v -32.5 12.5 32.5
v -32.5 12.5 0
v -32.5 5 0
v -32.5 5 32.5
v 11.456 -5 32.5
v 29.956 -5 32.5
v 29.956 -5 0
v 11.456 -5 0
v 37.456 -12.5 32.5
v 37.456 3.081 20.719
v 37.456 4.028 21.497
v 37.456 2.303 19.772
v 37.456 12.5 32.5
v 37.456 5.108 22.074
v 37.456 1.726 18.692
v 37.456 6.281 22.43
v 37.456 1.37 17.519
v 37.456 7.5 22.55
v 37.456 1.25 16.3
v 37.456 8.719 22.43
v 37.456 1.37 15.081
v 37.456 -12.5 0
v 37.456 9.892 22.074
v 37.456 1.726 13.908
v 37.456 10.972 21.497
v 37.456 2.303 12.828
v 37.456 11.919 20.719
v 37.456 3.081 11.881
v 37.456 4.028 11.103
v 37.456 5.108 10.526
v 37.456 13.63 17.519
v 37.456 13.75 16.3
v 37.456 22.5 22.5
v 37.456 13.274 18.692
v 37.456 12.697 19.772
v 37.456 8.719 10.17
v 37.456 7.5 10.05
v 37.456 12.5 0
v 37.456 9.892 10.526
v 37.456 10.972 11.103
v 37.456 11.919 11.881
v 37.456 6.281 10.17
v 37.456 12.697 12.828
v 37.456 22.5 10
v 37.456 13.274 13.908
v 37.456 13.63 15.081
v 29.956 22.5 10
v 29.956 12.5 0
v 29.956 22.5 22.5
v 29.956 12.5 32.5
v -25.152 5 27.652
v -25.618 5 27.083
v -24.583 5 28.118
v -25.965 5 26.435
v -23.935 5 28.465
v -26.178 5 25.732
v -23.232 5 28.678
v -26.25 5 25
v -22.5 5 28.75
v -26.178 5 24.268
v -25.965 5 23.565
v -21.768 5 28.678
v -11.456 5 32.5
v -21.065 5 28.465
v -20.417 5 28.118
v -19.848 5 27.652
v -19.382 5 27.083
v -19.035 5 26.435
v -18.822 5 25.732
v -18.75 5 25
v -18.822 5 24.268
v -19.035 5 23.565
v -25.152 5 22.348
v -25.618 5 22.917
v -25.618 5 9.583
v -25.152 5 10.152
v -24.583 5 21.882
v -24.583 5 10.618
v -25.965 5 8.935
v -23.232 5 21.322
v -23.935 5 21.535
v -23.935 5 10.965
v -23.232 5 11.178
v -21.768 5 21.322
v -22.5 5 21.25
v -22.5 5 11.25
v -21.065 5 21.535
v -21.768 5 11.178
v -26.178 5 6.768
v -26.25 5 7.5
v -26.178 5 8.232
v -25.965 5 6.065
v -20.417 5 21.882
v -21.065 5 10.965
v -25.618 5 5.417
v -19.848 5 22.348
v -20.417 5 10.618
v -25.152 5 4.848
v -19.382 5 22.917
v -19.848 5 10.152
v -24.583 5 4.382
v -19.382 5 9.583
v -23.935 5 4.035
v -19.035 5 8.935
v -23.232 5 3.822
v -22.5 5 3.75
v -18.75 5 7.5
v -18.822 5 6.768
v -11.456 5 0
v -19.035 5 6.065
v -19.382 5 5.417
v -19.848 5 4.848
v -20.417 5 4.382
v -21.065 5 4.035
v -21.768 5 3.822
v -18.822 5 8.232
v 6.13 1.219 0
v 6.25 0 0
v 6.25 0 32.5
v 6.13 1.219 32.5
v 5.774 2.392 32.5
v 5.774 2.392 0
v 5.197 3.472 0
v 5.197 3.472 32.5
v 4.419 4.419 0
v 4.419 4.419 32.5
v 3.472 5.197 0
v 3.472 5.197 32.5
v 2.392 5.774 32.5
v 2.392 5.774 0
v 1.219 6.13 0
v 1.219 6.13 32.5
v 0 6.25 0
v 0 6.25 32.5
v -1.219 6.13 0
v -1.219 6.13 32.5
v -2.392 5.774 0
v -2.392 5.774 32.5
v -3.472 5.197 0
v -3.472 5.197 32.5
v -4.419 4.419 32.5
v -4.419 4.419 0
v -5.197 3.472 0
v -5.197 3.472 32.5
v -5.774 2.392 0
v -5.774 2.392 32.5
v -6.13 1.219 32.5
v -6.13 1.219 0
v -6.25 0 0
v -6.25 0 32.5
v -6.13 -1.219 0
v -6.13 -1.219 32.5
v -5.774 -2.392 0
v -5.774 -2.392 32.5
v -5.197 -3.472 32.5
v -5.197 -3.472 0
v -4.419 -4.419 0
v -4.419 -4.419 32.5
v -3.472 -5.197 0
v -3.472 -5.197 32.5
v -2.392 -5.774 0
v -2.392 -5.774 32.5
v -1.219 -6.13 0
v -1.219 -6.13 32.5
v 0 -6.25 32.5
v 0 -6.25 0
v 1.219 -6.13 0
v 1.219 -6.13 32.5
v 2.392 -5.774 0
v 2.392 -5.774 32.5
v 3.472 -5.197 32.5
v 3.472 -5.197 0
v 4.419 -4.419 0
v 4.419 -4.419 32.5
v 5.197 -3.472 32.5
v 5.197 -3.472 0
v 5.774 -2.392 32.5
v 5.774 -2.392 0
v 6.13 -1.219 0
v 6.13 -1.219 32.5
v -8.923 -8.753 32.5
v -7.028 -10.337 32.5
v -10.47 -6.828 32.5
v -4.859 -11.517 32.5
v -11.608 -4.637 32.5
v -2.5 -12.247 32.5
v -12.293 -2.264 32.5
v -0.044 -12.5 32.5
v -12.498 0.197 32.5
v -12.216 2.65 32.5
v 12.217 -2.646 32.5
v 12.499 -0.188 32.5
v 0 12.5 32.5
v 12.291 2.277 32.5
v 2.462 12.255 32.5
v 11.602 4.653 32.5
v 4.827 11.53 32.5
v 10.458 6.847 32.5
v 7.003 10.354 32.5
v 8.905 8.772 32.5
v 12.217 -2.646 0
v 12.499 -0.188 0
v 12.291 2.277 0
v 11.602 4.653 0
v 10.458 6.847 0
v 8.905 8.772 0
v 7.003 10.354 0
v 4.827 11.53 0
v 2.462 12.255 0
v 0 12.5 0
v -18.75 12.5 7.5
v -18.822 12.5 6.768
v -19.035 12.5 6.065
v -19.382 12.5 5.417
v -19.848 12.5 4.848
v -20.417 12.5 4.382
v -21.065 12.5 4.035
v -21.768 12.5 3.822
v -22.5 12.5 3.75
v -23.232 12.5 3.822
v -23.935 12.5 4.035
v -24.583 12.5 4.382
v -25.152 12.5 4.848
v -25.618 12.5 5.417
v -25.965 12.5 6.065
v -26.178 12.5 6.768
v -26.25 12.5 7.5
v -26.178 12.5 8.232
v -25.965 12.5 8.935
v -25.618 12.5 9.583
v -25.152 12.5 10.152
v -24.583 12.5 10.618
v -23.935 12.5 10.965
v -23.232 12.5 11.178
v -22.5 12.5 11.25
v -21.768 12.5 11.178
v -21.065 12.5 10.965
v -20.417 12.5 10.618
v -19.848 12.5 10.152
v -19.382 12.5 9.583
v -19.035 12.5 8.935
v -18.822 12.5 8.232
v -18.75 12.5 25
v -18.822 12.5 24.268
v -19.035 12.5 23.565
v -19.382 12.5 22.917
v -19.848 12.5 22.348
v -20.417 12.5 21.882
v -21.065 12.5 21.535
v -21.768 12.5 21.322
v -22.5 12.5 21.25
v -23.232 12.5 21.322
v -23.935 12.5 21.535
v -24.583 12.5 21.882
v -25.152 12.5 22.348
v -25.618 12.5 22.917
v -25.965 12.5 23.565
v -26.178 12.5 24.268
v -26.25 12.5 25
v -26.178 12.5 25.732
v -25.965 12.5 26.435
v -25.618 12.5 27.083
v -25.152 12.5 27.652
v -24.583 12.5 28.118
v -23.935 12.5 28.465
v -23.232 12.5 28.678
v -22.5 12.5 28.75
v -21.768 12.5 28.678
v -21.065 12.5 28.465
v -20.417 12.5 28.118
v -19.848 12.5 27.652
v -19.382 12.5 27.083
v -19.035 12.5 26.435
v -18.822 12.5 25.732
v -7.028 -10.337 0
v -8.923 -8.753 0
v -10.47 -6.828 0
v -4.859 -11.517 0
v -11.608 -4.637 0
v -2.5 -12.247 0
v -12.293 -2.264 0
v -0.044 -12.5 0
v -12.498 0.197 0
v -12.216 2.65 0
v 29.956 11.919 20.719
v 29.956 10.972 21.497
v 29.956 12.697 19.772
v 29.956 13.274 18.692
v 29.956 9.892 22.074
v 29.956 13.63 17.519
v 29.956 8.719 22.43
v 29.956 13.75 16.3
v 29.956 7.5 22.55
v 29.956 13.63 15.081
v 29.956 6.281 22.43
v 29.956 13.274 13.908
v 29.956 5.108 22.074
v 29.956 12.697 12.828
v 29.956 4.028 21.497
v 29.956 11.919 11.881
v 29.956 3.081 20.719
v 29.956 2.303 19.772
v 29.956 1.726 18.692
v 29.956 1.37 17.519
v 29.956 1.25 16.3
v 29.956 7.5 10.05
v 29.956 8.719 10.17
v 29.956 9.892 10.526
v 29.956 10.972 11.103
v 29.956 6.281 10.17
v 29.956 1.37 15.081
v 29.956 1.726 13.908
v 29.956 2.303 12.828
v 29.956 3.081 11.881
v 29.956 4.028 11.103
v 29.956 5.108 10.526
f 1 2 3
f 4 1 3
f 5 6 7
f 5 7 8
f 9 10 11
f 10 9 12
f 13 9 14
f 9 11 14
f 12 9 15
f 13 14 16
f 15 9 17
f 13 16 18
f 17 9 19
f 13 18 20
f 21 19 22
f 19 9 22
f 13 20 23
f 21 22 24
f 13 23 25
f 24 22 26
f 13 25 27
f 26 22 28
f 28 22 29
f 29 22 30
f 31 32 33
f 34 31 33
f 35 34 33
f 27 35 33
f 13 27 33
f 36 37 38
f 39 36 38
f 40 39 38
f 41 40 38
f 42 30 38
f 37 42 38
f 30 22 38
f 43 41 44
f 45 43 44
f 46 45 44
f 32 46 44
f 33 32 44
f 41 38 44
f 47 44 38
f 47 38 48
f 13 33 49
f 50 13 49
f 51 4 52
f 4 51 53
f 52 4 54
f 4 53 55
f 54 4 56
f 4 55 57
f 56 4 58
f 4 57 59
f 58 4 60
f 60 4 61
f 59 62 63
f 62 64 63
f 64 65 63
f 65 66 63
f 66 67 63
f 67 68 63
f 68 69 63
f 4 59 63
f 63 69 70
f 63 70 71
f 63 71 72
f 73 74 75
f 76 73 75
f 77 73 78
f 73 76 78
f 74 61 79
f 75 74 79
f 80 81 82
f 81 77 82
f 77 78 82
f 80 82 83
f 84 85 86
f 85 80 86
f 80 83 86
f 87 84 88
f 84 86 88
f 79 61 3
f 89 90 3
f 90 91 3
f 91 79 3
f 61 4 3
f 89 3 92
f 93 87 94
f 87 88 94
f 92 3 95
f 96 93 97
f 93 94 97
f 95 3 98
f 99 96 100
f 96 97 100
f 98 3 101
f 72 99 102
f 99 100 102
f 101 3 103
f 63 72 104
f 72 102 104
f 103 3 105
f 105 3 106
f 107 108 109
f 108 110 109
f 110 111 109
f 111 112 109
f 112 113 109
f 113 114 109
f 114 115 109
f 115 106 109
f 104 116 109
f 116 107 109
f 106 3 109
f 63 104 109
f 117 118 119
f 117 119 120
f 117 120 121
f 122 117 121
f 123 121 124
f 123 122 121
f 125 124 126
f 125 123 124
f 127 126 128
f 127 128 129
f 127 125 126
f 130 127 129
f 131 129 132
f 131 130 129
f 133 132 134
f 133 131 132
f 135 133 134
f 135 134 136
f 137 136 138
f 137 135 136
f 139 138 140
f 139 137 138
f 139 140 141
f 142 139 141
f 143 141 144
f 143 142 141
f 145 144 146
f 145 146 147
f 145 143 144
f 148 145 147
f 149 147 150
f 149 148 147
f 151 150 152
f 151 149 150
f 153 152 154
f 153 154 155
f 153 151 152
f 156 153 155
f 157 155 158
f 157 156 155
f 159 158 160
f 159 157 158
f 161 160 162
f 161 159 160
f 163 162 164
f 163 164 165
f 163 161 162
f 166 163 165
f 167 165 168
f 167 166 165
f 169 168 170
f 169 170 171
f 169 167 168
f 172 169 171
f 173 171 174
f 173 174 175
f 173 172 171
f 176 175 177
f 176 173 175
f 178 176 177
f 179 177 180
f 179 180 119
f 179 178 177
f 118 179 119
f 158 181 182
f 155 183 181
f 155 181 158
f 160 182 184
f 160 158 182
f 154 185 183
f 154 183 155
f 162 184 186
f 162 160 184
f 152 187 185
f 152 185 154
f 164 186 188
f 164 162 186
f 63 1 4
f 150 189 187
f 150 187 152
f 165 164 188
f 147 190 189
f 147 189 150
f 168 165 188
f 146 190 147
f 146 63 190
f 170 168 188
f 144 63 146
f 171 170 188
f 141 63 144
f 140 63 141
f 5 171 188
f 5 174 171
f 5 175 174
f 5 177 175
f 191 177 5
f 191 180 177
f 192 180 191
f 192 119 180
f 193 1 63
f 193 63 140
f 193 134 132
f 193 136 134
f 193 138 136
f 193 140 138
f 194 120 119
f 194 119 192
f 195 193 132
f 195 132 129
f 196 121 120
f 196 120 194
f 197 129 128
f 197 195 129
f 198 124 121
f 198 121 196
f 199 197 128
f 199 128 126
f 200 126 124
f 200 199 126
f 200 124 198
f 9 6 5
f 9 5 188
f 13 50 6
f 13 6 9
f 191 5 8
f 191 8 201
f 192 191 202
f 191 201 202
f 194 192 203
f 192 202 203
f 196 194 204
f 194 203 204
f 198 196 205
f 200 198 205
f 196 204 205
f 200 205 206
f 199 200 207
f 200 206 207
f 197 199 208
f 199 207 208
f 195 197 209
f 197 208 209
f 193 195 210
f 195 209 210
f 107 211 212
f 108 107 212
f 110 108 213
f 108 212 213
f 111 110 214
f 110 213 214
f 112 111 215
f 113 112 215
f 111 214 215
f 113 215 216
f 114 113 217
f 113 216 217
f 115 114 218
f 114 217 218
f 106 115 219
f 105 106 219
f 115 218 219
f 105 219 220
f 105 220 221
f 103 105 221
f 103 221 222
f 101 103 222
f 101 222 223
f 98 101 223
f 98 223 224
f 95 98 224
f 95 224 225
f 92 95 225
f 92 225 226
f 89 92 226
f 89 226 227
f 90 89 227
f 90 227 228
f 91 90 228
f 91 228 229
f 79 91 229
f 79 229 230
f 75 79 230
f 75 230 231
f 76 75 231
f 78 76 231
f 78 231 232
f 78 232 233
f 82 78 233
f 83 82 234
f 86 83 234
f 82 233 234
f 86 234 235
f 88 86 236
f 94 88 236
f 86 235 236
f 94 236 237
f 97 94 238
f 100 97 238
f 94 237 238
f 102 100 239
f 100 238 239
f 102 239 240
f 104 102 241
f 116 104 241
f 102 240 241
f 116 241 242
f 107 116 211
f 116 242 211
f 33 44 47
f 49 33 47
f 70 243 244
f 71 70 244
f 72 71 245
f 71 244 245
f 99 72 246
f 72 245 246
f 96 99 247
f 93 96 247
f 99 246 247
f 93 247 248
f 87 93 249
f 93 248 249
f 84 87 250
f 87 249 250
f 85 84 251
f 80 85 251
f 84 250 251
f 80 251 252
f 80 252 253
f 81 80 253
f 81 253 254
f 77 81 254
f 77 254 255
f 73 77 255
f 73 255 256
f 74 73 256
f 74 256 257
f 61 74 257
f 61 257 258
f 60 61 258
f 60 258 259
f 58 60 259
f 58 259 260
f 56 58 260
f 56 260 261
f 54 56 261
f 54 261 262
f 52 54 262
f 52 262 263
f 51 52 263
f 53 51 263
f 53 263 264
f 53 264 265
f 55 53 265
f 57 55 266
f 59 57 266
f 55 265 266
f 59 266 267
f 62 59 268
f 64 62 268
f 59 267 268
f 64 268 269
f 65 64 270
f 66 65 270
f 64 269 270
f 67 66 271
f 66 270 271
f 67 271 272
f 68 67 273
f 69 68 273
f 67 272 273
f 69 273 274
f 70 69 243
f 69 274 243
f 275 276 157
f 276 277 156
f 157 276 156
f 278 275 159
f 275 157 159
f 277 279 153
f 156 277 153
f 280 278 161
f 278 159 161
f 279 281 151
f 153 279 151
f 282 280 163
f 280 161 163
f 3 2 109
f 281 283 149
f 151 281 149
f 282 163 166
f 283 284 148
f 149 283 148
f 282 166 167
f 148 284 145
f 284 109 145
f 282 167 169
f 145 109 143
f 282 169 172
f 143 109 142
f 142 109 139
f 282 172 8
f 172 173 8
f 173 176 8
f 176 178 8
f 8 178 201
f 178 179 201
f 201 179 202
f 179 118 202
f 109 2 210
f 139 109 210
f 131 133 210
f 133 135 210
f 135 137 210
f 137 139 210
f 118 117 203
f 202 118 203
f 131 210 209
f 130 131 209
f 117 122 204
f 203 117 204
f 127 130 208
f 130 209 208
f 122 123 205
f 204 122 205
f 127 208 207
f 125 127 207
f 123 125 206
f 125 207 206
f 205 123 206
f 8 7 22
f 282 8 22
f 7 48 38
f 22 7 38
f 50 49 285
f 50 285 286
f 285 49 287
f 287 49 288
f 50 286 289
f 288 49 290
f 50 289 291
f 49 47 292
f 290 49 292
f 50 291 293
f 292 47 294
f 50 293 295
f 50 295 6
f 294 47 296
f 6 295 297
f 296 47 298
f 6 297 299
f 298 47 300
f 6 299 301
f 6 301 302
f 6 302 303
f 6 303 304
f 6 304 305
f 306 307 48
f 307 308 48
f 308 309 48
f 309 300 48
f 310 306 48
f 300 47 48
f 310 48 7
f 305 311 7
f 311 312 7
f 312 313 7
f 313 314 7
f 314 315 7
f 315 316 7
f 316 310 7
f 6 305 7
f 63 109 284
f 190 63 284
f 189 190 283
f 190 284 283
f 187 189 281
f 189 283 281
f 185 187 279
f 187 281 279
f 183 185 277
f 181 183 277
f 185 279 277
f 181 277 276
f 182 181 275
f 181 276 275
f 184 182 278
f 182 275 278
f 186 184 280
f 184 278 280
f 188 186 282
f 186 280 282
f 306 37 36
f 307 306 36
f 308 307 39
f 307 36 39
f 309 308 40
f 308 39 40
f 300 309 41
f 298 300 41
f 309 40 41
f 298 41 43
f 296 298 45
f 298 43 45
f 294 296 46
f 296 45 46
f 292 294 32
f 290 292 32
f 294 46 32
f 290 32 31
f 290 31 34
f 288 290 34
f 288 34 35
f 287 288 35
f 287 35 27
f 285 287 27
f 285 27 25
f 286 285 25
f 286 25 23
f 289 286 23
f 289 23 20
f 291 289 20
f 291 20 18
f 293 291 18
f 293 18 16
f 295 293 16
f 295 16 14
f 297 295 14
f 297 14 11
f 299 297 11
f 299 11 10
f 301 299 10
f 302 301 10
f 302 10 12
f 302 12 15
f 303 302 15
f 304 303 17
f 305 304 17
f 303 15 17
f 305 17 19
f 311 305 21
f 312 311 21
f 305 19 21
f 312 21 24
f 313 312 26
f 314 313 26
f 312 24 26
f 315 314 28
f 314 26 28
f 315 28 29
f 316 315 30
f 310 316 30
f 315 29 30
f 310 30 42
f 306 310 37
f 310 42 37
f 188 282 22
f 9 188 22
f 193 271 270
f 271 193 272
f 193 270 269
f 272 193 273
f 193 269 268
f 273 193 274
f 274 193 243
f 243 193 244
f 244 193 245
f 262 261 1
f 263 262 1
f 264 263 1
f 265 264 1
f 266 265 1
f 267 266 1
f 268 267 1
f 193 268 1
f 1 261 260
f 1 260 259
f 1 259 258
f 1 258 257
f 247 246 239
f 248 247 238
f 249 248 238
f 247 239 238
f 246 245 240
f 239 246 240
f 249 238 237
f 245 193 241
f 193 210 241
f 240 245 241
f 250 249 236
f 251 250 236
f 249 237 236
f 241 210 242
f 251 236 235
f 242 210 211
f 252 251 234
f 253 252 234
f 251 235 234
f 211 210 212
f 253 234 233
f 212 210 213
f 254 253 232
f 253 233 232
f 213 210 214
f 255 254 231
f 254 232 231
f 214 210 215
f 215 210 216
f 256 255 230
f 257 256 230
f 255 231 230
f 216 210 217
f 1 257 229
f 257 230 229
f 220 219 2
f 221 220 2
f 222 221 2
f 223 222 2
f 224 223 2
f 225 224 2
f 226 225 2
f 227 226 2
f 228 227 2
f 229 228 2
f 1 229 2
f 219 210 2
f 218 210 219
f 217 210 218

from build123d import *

# Parameters (mm, degrees)
SKETCH1_R               = 6.25
BOSS_EXTRUDE1_DEPTH     = 32.5
SKETCH2_R               = 3.75
CUT_EXTRUDE1_DEPTH      = 11.000075787
CUT_EXTRUDE1_DEPTH_BACK = 25.999924213
CUT_EXTRUDE2_REACH      = 71.956
SKETCH3_R               = 6.25
CHAMFER1_SIZE           = 10


with BuildPart() as part:
    # Sketch1 → Boss-Extrude1 (new body)
    with BuildSketch(Plane.XY):
        with BuildLine():
            Line((0, 12.5), (-32.5, 12.5))
            Line((-32.5, 12.5), (-32.5, 5))
            Line((-32.5, 5), (-11.456439237, 5))
            ThreePointArc((-11.456439237, 5), (-10.470155046, -6.828312626), (-0.043527687, -12.499924213))
            Line((-0.043527687, -12.499924213), (37.456472313, -12.499924213))
            Line((37.456472313, -12.499924213), (37.456472313, 22.500075787))
            Line((37.456472313, 22.500075787), (29.956472313, 22.500075787))
            Line((29.956472313, 22.500075787), (29.956472313, -4.999924213))
            Line((29.956472313, -4.999924213), (11.456472313, -4.999924213))
            ThreePointArc((11.456472313, -4.999924213), (10.458227686, 6.84656656), (0, 12.5))
        make_face()
        Circle(SKETCH1_R, mode=Mode.SUBTRACT)
    extrude(amount=BOSS_EXTRUDE1_DEPTH)

    # Sketch2 → Cut-Extrude1 (cut, two sides)
    with BuildSketch(Plane(origin=(0, 12.5, 0), x_dir=(1, 0, 0), z_dir=(0, 1, 0))) as cut_extrude1_sk:
        with Locations((-22.5, -7.5)):
            Circle(SKETCH2_R)
        with Locations((-22.5, -25)):
            Circle(SKETCH2_R)
    extrude(amount=CUT_EXTRUDE1_DEPTH, mode=Mode.SUBTRACT)
    extrude(cut_extrude1_sk.sketch, amount=-CUT_EXTRUDE1_DEPTH_BACK, mode=Mode.SUBTRACT)

    # Sketch3 → Cut-Extrude2 (cut, up to next)
    with BuildSketch(Plane(origin=(37.456472313, 0, 0), x_dir=(0, 0, -1), z_dir=(1, 0, 0)), mode=Mode.PRIVATE) as cut_extrude2_sk1:
        with Locations((-16.3, 7.500075787)):
            Circle(SKETCH3_R)
    cut_extrude2_tool1 = extrude(cut_extrude2_sk1.sketch, amount=-CUT_EXTRUDE2_REACH, mode=Mode.PRIVATE) & part.part
    add(cut_extrude2_tool1.solids().sort_by_distance((37.456472, 7.500076, 16.3))[0], mode=Mode.SUBTRACT)

    # Chamfer1
    chamfer1_edges = [part.edges().sort_by_distance(p)[0] for p in [
        (33.706472313, 22.500075787, 0),
        (33.706472313, 22.500075787, 32.5),
    ]]
    chamfer(chamfer1_edges, length=CHAMFER1_SIZE)


solid = part.part
